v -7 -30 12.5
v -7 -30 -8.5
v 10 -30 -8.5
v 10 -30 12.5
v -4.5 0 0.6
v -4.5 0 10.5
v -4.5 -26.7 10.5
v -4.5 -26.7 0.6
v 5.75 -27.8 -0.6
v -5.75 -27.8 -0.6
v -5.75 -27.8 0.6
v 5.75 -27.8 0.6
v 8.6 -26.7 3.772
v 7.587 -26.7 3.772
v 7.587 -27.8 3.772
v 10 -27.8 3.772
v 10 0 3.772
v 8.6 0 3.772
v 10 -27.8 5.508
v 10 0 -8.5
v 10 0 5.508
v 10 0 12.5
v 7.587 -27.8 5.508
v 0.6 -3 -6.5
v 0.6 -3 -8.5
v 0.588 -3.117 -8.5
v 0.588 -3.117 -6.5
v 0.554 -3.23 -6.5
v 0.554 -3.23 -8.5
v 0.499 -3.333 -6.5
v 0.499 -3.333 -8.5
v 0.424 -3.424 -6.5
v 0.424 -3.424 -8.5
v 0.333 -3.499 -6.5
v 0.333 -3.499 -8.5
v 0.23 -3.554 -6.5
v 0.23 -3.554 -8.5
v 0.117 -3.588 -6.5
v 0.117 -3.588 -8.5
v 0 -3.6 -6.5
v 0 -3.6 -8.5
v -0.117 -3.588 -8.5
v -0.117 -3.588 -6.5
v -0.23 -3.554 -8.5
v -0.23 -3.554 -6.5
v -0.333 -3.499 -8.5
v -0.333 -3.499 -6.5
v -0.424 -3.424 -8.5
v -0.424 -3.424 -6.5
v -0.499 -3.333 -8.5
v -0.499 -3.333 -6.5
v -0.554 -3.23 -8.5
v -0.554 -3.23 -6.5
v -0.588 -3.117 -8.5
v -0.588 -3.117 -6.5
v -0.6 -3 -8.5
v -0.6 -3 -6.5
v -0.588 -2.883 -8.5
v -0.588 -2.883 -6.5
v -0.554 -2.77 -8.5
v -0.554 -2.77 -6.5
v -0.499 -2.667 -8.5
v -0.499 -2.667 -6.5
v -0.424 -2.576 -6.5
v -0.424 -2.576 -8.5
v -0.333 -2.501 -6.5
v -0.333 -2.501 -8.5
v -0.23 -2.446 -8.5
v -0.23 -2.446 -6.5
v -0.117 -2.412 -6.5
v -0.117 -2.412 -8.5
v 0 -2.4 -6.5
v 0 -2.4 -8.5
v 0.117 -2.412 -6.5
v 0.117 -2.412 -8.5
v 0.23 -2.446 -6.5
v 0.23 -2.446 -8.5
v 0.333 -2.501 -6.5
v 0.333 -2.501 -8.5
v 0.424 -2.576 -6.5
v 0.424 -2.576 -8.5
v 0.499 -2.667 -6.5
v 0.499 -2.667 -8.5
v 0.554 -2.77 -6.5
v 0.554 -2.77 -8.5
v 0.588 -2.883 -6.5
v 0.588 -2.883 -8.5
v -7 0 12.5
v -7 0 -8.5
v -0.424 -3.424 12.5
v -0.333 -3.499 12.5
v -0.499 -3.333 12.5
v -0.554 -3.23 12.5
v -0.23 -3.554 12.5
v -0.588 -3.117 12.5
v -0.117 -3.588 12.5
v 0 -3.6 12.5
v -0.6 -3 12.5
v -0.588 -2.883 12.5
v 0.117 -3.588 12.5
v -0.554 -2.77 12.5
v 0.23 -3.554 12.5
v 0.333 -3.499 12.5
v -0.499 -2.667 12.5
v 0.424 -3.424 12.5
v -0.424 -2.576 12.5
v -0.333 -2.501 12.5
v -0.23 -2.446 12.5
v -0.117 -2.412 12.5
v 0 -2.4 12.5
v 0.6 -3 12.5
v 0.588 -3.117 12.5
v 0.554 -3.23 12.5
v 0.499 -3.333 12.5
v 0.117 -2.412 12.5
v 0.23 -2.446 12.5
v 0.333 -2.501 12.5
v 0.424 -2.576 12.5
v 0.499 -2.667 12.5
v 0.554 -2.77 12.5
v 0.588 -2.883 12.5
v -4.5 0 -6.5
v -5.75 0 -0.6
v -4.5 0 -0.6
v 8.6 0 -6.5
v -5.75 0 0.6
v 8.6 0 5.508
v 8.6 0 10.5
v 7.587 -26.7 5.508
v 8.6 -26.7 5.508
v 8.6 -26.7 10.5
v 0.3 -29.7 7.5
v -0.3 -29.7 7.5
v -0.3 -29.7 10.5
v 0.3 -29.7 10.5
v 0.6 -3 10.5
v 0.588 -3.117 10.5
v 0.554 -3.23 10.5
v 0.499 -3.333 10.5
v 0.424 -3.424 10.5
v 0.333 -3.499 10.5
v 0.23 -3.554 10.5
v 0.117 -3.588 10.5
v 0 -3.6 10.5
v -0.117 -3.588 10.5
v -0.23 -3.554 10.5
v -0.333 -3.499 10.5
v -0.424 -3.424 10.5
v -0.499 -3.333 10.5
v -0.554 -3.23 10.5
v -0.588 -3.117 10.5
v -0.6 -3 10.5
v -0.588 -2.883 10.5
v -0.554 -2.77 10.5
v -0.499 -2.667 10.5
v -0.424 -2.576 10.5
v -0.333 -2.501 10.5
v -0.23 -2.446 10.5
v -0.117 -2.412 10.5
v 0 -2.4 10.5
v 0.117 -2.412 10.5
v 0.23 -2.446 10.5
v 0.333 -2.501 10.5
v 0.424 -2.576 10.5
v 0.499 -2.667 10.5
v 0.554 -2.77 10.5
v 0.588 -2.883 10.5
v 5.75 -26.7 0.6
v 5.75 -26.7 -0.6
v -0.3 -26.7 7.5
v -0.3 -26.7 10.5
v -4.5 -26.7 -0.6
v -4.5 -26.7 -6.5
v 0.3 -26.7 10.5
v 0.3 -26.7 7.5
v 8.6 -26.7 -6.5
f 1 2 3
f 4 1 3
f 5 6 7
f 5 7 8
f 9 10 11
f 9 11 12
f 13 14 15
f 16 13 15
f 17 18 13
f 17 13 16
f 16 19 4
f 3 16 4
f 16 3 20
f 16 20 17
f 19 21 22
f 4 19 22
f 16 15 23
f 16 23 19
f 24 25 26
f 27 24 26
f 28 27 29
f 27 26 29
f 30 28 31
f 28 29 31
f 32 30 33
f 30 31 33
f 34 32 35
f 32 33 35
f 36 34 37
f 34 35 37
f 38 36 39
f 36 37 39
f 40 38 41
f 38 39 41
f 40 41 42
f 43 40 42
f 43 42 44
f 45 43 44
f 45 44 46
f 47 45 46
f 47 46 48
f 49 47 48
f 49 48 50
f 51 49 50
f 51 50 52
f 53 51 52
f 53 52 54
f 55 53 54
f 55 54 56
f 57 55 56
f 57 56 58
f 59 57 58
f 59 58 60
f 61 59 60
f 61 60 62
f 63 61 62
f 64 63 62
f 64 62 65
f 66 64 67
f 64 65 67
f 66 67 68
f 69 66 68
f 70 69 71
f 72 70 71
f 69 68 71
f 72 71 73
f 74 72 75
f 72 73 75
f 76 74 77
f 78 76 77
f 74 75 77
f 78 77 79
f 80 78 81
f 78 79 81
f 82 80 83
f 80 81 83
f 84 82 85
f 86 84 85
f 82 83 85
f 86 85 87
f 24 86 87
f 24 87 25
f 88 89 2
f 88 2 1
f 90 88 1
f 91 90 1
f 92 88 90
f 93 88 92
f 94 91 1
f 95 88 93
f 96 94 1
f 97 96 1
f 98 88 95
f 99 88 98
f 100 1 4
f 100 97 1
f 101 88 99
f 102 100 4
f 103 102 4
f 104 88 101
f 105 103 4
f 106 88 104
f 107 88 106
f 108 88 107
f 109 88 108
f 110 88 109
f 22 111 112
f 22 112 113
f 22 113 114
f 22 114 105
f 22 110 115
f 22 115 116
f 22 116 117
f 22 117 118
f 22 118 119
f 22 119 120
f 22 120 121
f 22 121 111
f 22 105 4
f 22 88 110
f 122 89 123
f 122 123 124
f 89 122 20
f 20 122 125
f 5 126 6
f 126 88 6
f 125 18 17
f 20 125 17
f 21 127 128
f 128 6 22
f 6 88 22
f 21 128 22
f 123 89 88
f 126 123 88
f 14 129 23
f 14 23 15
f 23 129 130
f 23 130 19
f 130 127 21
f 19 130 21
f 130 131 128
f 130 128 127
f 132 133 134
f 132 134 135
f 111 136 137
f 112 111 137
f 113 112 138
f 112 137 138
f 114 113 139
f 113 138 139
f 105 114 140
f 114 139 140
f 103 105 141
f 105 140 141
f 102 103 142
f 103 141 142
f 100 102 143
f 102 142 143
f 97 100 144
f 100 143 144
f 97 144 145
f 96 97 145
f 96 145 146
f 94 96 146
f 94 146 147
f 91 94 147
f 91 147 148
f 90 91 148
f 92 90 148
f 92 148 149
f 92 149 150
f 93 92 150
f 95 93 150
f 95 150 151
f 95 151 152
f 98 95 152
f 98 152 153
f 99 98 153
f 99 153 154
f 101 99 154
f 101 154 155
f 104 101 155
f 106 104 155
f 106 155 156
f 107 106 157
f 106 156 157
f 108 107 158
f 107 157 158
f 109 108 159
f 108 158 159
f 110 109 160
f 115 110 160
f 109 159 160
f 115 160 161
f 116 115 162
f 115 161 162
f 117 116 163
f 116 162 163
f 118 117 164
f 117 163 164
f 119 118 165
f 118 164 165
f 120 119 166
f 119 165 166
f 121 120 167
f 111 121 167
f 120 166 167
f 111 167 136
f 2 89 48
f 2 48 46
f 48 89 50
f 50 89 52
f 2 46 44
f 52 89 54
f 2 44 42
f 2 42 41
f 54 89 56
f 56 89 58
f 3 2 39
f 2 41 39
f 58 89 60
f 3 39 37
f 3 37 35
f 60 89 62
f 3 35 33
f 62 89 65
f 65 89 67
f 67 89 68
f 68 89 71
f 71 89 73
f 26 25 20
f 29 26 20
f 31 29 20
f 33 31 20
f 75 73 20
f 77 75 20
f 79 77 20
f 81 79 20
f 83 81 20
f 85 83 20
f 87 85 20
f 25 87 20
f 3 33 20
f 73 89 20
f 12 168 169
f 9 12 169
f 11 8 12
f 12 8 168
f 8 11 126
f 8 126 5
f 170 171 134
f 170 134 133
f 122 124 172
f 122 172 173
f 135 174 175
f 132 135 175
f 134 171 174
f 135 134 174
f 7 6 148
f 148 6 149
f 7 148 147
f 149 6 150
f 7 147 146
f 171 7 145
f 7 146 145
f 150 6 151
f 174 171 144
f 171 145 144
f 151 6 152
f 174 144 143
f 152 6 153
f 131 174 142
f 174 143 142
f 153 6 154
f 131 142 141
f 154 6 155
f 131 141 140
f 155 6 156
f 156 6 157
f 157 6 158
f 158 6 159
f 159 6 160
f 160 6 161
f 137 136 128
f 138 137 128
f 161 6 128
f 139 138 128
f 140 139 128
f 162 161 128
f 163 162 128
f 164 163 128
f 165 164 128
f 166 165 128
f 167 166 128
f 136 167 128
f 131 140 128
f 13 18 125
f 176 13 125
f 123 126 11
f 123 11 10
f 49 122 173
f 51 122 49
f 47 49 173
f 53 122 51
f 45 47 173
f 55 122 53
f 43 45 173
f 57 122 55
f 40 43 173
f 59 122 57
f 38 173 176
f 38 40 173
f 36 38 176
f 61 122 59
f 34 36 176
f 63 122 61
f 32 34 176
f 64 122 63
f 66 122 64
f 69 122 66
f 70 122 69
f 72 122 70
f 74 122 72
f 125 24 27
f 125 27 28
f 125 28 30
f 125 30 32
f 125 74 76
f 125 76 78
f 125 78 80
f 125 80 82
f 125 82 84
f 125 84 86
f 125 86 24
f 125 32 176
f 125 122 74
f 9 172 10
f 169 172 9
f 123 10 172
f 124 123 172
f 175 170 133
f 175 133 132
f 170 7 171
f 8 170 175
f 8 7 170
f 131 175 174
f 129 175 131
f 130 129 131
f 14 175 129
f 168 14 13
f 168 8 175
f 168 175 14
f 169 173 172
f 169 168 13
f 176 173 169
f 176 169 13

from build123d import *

# Parameters (mm, degrees)
SKETCH012_W     = 17
SKETCH012_H     = 21
PAD009_DEPTH    = 30
SKETCH013_W     = 13.1
SKETCH013_H     = 17
POCKET001_DEPTH = 26.7
SKETCH014_W     = 11.5
SKETCH014_H     = 1.2
SKETCH014_W_2   = 3.205285
SKETCH014_H_2   = 1.736194
POCKET002_DEPTH = 27.8
SKETCH016_R     = 0.6
POCKET003_DEPTH = 27
SKETCH022_W     = 0.6
SKETCH022_H     = 3
POCKET005_DEPTH = 3


with BuildPart() as part:
    # Sketch012 → Pad009 (new body)
    with BuildSketch(Plane.XZ):
        with Locations((1.5, 2)):
            Rectangle(SKETCH012_W, SKETCH012_H)
    extrude(amount=PAD009_DEPTH)

    # Sketch013 (on Face5 of Pad009) → Pocket001 (cut)
    with BuildSketch(Plane(origin=(0, 0, 0), x_dir=(1, 0, 0), z_dir=(0, 1, 0))):
        with Locations((2.05, -2)):
            Rectangle(SKETCH013_W, SKETCH013_H)
    extrude(amount=-POCKET001_DEPTH, mode=Mode.SUBTRACT)

    # Sketch014 (on Face4 of Pocket001) → Pocket002 (cut)
    with BuildSketch(Plane(origin=(0, 0, 0), x_dir=(1, 0, 0), z_dir=(0, 1, 0))):
        Rectangle(SKETCH014_W, SKETCH014_H)
        with Locations((9.189982, -4.640042)):
            Rectangle(SKETCH014_W_2, SKETCH014_H_2)
    extrude(amount=-POCKET002_DEPTH, mode=Mode.SUBTRACT)

    # Sketch016 (on Face6 of Pocket002) → Pocket003 (cut)
    with BuildSketch(Plane(origin=(0, 0, -8.5), x_dir=(1, 0, 0), z_dir=(0, 0, -1))):
        with Locations((0, 3)):
            Circle(SKETCH016_R)
    extrude(amount=-POCKET003_DEPTH, mode=Mode.SUBTRACT)

    # Sketch022 (on Face21 of Pocket003) → Pocket005 (cut)
    with BuildSketch(Plane(origin=(0, -26.7, 0), x_dir=(1, 0, 0), z_dir=(0, 1, 0))):
        with Locations((0, -9)):
            Rectangle(SKETCH022_W, SKETCH022_H)
    extrude(amount=-POCKET005_DEPTH, mode=Mode.SUBTRACT)


solid = part.part
